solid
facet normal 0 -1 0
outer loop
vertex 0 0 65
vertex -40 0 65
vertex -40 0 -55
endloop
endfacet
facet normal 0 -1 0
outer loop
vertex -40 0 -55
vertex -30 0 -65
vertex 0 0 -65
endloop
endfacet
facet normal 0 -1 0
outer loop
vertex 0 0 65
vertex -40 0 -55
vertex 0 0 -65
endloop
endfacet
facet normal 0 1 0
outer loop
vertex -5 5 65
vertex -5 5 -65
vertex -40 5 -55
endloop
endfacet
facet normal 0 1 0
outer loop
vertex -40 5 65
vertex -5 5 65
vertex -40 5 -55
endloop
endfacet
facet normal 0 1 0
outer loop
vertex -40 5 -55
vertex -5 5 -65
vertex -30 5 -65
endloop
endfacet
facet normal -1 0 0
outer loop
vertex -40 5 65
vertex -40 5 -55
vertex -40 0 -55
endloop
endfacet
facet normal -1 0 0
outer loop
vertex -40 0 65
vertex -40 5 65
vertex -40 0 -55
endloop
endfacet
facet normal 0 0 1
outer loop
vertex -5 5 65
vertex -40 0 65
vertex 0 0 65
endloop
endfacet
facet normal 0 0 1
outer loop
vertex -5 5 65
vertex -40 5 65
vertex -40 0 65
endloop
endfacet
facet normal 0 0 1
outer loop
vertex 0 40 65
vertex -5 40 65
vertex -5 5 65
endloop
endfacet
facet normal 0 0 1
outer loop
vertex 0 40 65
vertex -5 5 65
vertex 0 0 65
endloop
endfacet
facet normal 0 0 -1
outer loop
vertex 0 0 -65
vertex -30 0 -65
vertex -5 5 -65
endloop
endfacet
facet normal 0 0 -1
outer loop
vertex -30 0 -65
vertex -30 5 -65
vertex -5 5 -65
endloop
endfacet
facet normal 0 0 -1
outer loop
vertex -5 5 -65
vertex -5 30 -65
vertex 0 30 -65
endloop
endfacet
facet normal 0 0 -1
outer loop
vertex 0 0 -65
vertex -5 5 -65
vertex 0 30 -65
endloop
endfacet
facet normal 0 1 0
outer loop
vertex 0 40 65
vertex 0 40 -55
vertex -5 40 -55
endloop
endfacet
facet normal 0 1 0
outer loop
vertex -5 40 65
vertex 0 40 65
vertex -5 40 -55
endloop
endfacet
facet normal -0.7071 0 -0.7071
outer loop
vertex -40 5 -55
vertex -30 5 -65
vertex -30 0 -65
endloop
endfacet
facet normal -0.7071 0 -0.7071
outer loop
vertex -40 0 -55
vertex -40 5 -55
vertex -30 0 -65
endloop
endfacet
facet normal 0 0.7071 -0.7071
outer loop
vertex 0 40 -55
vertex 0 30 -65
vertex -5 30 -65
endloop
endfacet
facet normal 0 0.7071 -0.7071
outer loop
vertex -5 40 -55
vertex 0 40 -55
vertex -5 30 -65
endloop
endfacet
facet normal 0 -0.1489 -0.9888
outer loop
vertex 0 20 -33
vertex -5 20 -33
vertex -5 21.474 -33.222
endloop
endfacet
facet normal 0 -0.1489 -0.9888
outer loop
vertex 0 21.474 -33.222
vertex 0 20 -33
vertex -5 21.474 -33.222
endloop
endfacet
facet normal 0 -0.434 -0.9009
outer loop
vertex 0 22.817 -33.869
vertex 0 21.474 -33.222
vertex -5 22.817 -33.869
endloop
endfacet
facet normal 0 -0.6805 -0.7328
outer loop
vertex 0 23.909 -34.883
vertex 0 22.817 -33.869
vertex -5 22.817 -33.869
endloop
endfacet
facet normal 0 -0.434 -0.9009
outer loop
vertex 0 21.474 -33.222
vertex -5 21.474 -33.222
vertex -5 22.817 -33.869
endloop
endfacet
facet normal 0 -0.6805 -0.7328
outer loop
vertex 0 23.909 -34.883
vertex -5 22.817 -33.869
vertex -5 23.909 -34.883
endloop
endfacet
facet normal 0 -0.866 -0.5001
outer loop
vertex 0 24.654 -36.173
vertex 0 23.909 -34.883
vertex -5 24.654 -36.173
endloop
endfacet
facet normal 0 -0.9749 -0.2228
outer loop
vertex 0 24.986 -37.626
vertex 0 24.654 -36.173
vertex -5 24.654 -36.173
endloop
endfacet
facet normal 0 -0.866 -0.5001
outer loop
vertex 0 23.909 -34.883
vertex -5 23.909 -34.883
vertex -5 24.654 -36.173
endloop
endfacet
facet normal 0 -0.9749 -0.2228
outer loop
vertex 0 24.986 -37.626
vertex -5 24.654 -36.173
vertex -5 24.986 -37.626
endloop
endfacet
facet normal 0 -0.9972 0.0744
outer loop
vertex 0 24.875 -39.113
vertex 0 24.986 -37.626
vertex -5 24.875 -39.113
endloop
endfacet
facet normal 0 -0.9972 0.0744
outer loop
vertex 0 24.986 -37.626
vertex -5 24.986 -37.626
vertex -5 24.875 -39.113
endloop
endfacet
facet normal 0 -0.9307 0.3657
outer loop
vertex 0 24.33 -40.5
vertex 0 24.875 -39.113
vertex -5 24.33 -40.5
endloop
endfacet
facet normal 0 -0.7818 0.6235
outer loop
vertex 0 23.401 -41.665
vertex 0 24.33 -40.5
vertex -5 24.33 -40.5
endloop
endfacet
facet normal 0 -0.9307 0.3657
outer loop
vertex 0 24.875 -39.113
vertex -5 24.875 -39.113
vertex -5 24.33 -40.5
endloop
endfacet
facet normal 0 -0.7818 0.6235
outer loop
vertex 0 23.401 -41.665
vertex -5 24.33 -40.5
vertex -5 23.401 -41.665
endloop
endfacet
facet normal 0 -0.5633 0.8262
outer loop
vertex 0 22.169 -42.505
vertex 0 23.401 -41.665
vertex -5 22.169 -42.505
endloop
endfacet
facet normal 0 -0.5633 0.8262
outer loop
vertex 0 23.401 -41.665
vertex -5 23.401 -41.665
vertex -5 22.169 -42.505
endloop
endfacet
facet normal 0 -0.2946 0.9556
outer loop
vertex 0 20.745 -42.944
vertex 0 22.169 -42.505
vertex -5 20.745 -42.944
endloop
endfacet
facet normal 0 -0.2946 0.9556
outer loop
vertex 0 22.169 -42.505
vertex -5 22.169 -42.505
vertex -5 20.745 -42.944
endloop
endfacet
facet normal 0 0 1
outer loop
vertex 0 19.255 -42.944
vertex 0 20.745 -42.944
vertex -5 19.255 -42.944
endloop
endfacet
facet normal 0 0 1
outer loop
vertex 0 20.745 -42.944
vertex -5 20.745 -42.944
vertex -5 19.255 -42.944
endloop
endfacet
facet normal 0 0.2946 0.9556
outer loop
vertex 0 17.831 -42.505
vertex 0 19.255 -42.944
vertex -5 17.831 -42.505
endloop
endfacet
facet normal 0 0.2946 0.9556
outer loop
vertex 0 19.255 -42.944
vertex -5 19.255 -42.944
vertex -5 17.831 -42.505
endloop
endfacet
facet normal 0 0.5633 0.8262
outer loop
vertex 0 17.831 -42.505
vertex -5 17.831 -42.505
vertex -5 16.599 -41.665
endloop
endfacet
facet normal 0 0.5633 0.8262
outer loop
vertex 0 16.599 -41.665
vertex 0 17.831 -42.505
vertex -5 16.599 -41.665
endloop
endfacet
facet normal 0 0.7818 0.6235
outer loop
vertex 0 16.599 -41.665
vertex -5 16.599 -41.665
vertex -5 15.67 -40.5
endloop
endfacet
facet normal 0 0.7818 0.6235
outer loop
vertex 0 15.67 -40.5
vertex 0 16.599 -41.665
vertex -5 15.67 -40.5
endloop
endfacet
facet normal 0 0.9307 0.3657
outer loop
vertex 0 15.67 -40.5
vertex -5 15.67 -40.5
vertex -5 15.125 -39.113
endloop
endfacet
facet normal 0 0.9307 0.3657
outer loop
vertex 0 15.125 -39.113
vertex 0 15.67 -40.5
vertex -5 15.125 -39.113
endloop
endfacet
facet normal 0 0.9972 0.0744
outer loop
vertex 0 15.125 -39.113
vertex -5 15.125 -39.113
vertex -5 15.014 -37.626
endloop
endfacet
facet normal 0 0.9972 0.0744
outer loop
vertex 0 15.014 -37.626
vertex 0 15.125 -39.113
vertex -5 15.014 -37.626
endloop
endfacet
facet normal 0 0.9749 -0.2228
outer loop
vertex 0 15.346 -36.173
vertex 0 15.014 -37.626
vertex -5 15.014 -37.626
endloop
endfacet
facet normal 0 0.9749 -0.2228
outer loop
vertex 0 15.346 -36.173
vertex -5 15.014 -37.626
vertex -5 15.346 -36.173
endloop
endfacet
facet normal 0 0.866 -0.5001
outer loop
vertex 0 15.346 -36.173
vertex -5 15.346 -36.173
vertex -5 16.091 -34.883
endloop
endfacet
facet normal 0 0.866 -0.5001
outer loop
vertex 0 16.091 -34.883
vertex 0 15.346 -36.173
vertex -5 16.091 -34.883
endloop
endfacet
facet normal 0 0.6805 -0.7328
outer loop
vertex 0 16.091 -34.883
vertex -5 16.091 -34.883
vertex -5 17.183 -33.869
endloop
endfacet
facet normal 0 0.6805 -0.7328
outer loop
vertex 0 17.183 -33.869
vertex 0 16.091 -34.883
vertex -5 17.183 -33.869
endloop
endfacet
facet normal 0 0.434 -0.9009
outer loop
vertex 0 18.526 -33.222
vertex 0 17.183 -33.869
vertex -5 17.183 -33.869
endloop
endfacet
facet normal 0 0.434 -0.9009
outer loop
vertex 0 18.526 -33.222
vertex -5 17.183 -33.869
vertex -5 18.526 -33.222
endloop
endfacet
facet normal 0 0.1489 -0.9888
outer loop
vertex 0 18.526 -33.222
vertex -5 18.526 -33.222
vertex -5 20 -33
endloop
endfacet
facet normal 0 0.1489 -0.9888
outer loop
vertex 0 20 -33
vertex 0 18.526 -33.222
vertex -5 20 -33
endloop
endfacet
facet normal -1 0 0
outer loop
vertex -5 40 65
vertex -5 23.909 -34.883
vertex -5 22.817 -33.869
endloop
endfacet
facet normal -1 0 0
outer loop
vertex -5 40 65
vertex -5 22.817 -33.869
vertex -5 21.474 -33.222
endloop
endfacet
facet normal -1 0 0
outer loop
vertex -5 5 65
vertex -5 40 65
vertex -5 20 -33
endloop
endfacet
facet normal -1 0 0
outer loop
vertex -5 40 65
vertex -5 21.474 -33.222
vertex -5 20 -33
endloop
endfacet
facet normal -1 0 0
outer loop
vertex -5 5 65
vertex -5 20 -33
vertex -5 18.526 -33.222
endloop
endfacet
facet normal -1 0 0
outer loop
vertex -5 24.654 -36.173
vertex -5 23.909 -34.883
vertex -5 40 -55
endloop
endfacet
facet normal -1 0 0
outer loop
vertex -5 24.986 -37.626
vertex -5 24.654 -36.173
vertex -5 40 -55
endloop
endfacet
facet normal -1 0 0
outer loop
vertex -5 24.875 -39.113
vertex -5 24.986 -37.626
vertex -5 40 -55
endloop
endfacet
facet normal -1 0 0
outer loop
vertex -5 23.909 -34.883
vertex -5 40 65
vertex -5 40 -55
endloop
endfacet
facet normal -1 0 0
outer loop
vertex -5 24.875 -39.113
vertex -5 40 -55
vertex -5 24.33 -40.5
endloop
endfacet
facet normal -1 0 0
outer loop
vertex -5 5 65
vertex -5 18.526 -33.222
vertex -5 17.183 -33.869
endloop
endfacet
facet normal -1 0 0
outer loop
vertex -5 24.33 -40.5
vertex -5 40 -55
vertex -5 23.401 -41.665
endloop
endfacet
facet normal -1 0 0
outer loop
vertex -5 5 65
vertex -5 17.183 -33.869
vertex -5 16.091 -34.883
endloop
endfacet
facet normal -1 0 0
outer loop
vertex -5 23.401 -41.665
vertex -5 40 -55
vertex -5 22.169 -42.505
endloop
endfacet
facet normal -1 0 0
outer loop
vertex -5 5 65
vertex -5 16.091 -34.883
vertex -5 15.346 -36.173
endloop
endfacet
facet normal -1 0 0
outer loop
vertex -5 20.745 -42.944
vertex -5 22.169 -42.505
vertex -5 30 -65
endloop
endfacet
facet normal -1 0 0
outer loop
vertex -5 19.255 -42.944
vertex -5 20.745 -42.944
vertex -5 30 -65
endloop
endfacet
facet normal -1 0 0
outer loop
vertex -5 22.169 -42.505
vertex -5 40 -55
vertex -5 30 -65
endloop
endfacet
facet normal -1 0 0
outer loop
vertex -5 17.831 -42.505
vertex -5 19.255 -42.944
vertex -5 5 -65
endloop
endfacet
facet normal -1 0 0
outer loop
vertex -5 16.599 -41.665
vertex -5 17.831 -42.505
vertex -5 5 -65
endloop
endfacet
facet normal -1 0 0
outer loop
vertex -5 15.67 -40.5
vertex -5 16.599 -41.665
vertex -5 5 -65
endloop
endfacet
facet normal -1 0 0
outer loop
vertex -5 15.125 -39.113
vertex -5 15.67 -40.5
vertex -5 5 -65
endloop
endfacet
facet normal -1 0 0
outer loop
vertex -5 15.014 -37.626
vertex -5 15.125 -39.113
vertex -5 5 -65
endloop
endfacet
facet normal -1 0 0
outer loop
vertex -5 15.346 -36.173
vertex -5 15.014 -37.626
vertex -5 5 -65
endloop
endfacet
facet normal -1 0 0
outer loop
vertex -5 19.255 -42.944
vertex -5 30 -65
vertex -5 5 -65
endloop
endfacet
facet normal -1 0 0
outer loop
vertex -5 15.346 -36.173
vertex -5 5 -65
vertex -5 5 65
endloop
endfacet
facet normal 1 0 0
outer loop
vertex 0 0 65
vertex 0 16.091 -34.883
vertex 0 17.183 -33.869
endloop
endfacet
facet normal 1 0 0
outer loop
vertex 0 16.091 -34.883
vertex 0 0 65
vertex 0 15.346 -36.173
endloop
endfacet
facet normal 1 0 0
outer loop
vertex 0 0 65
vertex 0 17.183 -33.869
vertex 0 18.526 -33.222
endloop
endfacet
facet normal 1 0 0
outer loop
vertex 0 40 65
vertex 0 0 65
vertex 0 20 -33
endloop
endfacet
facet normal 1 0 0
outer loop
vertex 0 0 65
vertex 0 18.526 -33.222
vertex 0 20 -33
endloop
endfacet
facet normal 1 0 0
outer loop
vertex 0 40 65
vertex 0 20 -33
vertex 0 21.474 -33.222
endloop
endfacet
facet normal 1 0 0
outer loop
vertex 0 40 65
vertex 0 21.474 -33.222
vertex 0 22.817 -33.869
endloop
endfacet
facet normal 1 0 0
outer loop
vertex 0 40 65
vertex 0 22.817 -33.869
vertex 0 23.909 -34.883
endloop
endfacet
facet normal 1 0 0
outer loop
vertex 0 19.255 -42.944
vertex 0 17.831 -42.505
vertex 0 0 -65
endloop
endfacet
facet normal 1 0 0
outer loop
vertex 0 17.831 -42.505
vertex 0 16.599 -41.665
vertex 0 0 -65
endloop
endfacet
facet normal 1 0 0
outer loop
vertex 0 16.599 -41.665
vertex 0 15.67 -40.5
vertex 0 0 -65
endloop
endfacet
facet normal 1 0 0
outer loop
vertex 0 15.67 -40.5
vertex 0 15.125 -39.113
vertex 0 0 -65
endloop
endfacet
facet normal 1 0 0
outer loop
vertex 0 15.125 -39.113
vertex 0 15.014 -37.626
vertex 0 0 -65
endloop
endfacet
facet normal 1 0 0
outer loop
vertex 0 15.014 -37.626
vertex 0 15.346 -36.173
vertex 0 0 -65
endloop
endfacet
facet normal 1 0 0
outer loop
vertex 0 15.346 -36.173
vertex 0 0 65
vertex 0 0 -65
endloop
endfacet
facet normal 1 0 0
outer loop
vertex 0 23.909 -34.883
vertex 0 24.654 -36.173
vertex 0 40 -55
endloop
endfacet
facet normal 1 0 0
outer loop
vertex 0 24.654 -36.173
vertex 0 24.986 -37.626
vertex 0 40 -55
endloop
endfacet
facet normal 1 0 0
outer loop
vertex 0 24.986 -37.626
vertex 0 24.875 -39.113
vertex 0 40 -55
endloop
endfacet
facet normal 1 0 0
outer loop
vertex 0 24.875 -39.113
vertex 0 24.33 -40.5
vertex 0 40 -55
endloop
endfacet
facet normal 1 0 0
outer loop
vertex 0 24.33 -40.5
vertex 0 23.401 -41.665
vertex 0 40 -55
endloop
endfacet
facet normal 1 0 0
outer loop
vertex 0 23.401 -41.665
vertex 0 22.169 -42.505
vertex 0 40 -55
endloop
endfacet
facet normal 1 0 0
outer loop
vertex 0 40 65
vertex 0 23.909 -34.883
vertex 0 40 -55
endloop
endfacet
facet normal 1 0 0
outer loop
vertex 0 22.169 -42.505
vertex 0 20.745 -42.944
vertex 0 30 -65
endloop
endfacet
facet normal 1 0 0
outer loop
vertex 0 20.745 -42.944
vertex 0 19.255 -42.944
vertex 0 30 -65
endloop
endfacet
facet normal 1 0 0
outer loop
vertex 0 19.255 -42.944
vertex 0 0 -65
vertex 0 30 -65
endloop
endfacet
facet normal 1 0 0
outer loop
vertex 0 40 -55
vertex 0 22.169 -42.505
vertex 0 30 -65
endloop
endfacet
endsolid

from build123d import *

# Parameters (mm, degrees)
EXTRUDE_THIN1_DEPTH      = 65
EXTRUDE_THIN1_DEPTH_BACK = 65
CHAMFER1_SIZE            = 10
SKETCH3_R                = 5
CUT_EXTRUDE1_DEPTH       = 10


with BuildPart() as part:
    # Sketch2 → Extrude-Thin1 (new, two sides: drawn at the far end of the back side and taken through both)
    with BuildSketch(Plane.XY.offset(-EXTRUDE_THIN1_DEPTH_BACK)):
        Polygon((-40, 0), (0, 0), (0, 40), (-5, 40), (-5, 5), (-40, 5), align=None)
    extrude(amount=EXTRUDE_THIN1_DEPTH + EXTRUDE_THIN1_DEPTH_BACK)

    # Chamfer1
    chamfer1_edges = [part.edges().sort_by_distance(p)[0] for p in [
        (-40, 2.5, -65),
        (-2.5, 40, -65),
    ]]
    chamfer(chamfer1_edges, length=CHAMFER1_SIZE)

    # Sketch3 → Cut-Extrude1 (cut)
    with BuildSketch(Plane.ZY.offset(5)):
        with Locations((-38, 20)):
            Circle(SKETCH3_R)
    extrude(amount=-CUT_EXTRUDE1_DEPTH, mode=Mode.SUBTRACT)


solid = part.part
